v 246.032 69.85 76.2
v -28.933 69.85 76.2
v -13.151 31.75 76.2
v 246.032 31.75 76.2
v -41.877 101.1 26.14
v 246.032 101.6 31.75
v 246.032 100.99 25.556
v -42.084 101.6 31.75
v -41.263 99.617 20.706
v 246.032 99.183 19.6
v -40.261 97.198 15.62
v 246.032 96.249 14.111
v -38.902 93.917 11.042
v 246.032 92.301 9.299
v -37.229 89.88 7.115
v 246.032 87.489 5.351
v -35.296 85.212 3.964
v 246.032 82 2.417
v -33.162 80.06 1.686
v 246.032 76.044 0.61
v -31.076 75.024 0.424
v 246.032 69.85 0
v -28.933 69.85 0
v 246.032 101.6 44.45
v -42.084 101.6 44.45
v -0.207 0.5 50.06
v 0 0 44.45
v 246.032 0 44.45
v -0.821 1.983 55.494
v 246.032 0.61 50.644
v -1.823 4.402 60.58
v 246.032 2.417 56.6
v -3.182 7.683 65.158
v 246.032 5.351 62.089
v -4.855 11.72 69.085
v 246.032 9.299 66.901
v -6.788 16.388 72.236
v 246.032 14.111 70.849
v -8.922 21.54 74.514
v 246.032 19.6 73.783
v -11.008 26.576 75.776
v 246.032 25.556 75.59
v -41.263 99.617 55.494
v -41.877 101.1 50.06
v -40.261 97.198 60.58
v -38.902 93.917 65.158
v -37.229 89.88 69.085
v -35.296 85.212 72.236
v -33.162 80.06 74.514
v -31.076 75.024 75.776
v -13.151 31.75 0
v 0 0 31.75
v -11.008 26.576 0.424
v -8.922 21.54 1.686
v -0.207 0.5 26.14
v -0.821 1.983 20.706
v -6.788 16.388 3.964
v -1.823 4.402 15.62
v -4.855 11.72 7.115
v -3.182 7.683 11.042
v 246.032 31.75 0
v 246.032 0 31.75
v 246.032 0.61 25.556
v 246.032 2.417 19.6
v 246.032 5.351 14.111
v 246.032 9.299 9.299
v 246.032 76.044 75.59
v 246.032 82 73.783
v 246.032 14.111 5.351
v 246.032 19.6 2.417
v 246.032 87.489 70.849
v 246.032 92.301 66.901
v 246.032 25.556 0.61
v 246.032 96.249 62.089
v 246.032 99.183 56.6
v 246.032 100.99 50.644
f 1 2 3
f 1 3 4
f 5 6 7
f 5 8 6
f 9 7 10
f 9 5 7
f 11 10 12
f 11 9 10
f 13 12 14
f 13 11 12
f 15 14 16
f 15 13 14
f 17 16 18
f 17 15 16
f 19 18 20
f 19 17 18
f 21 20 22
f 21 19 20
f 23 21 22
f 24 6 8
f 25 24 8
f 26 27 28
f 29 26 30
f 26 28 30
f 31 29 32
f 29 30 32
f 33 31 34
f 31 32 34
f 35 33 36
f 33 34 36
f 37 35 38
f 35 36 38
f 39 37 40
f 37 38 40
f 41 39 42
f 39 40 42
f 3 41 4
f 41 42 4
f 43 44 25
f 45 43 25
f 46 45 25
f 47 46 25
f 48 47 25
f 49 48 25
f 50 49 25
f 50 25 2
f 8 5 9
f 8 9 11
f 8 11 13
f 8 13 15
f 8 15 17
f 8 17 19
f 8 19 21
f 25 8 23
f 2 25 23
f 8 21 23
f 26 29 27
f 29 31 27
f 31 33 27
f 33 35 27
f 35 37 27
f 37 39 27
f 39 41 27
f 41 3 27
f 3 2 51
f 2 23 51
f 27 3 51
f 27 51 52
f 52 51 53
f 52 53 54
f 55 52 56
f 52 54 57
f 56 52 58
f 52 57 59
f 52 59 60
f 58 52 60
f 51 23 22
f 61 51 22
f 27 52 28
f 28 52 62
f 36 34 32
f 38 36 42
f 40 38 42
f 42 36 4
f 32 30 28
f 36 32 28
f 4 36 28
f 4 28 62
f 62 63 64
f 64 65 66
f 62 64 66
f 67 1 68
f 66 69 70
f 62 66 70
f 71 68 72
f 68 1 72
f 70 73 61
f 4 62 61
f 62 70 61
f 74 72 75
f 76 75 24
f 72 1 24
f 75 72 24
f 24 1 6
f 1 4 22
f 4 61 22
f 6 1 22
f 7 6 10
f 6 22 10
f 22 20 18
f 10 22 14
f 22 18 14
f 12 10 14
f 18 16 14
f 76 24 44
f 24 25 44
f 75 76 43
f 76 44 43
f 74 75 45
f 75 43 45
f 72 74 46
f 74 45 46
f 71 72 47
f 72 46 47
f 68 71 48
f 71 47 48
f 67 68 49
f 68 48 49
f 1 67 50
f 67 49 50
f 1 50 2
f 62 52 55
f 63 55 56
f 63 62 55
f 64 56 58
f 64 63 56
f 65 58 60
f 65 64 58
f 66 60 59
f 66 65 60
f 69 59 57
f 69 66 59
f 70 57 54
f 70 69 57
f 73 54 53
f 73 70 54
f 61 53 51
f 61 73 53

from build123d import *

# Parameters (mm, degrees)
F1_DEPTH = 76.2
F2_R     = 31.75


# Not quite as in the source:
# - a feature names something its author has since deleted; it is built from what else it names


with BuildPart() as f1:
    # F0 (on Top) → F1 (new body)
    with BuildSketch(Plane.XY):
        Polygon((-42.0840979371, 101.6), (0, 0), (246.0318041258, 0), (246.0318041258, 101.6), align=None)
    extrude(amount=F1_DEPTH)

    # F2
    f2_edges = [f1.edges().sort_by_distance(p)[0] for p in [
        (123.015902, 0, 76.2),
        (123.015902, 0, 0),
        (101.973853, 101.6, 76.2),
        (101.973853, 101.6, 0),
    ]]
    fillet(f2_edges, radius=F2_R)


solid = f1.part
